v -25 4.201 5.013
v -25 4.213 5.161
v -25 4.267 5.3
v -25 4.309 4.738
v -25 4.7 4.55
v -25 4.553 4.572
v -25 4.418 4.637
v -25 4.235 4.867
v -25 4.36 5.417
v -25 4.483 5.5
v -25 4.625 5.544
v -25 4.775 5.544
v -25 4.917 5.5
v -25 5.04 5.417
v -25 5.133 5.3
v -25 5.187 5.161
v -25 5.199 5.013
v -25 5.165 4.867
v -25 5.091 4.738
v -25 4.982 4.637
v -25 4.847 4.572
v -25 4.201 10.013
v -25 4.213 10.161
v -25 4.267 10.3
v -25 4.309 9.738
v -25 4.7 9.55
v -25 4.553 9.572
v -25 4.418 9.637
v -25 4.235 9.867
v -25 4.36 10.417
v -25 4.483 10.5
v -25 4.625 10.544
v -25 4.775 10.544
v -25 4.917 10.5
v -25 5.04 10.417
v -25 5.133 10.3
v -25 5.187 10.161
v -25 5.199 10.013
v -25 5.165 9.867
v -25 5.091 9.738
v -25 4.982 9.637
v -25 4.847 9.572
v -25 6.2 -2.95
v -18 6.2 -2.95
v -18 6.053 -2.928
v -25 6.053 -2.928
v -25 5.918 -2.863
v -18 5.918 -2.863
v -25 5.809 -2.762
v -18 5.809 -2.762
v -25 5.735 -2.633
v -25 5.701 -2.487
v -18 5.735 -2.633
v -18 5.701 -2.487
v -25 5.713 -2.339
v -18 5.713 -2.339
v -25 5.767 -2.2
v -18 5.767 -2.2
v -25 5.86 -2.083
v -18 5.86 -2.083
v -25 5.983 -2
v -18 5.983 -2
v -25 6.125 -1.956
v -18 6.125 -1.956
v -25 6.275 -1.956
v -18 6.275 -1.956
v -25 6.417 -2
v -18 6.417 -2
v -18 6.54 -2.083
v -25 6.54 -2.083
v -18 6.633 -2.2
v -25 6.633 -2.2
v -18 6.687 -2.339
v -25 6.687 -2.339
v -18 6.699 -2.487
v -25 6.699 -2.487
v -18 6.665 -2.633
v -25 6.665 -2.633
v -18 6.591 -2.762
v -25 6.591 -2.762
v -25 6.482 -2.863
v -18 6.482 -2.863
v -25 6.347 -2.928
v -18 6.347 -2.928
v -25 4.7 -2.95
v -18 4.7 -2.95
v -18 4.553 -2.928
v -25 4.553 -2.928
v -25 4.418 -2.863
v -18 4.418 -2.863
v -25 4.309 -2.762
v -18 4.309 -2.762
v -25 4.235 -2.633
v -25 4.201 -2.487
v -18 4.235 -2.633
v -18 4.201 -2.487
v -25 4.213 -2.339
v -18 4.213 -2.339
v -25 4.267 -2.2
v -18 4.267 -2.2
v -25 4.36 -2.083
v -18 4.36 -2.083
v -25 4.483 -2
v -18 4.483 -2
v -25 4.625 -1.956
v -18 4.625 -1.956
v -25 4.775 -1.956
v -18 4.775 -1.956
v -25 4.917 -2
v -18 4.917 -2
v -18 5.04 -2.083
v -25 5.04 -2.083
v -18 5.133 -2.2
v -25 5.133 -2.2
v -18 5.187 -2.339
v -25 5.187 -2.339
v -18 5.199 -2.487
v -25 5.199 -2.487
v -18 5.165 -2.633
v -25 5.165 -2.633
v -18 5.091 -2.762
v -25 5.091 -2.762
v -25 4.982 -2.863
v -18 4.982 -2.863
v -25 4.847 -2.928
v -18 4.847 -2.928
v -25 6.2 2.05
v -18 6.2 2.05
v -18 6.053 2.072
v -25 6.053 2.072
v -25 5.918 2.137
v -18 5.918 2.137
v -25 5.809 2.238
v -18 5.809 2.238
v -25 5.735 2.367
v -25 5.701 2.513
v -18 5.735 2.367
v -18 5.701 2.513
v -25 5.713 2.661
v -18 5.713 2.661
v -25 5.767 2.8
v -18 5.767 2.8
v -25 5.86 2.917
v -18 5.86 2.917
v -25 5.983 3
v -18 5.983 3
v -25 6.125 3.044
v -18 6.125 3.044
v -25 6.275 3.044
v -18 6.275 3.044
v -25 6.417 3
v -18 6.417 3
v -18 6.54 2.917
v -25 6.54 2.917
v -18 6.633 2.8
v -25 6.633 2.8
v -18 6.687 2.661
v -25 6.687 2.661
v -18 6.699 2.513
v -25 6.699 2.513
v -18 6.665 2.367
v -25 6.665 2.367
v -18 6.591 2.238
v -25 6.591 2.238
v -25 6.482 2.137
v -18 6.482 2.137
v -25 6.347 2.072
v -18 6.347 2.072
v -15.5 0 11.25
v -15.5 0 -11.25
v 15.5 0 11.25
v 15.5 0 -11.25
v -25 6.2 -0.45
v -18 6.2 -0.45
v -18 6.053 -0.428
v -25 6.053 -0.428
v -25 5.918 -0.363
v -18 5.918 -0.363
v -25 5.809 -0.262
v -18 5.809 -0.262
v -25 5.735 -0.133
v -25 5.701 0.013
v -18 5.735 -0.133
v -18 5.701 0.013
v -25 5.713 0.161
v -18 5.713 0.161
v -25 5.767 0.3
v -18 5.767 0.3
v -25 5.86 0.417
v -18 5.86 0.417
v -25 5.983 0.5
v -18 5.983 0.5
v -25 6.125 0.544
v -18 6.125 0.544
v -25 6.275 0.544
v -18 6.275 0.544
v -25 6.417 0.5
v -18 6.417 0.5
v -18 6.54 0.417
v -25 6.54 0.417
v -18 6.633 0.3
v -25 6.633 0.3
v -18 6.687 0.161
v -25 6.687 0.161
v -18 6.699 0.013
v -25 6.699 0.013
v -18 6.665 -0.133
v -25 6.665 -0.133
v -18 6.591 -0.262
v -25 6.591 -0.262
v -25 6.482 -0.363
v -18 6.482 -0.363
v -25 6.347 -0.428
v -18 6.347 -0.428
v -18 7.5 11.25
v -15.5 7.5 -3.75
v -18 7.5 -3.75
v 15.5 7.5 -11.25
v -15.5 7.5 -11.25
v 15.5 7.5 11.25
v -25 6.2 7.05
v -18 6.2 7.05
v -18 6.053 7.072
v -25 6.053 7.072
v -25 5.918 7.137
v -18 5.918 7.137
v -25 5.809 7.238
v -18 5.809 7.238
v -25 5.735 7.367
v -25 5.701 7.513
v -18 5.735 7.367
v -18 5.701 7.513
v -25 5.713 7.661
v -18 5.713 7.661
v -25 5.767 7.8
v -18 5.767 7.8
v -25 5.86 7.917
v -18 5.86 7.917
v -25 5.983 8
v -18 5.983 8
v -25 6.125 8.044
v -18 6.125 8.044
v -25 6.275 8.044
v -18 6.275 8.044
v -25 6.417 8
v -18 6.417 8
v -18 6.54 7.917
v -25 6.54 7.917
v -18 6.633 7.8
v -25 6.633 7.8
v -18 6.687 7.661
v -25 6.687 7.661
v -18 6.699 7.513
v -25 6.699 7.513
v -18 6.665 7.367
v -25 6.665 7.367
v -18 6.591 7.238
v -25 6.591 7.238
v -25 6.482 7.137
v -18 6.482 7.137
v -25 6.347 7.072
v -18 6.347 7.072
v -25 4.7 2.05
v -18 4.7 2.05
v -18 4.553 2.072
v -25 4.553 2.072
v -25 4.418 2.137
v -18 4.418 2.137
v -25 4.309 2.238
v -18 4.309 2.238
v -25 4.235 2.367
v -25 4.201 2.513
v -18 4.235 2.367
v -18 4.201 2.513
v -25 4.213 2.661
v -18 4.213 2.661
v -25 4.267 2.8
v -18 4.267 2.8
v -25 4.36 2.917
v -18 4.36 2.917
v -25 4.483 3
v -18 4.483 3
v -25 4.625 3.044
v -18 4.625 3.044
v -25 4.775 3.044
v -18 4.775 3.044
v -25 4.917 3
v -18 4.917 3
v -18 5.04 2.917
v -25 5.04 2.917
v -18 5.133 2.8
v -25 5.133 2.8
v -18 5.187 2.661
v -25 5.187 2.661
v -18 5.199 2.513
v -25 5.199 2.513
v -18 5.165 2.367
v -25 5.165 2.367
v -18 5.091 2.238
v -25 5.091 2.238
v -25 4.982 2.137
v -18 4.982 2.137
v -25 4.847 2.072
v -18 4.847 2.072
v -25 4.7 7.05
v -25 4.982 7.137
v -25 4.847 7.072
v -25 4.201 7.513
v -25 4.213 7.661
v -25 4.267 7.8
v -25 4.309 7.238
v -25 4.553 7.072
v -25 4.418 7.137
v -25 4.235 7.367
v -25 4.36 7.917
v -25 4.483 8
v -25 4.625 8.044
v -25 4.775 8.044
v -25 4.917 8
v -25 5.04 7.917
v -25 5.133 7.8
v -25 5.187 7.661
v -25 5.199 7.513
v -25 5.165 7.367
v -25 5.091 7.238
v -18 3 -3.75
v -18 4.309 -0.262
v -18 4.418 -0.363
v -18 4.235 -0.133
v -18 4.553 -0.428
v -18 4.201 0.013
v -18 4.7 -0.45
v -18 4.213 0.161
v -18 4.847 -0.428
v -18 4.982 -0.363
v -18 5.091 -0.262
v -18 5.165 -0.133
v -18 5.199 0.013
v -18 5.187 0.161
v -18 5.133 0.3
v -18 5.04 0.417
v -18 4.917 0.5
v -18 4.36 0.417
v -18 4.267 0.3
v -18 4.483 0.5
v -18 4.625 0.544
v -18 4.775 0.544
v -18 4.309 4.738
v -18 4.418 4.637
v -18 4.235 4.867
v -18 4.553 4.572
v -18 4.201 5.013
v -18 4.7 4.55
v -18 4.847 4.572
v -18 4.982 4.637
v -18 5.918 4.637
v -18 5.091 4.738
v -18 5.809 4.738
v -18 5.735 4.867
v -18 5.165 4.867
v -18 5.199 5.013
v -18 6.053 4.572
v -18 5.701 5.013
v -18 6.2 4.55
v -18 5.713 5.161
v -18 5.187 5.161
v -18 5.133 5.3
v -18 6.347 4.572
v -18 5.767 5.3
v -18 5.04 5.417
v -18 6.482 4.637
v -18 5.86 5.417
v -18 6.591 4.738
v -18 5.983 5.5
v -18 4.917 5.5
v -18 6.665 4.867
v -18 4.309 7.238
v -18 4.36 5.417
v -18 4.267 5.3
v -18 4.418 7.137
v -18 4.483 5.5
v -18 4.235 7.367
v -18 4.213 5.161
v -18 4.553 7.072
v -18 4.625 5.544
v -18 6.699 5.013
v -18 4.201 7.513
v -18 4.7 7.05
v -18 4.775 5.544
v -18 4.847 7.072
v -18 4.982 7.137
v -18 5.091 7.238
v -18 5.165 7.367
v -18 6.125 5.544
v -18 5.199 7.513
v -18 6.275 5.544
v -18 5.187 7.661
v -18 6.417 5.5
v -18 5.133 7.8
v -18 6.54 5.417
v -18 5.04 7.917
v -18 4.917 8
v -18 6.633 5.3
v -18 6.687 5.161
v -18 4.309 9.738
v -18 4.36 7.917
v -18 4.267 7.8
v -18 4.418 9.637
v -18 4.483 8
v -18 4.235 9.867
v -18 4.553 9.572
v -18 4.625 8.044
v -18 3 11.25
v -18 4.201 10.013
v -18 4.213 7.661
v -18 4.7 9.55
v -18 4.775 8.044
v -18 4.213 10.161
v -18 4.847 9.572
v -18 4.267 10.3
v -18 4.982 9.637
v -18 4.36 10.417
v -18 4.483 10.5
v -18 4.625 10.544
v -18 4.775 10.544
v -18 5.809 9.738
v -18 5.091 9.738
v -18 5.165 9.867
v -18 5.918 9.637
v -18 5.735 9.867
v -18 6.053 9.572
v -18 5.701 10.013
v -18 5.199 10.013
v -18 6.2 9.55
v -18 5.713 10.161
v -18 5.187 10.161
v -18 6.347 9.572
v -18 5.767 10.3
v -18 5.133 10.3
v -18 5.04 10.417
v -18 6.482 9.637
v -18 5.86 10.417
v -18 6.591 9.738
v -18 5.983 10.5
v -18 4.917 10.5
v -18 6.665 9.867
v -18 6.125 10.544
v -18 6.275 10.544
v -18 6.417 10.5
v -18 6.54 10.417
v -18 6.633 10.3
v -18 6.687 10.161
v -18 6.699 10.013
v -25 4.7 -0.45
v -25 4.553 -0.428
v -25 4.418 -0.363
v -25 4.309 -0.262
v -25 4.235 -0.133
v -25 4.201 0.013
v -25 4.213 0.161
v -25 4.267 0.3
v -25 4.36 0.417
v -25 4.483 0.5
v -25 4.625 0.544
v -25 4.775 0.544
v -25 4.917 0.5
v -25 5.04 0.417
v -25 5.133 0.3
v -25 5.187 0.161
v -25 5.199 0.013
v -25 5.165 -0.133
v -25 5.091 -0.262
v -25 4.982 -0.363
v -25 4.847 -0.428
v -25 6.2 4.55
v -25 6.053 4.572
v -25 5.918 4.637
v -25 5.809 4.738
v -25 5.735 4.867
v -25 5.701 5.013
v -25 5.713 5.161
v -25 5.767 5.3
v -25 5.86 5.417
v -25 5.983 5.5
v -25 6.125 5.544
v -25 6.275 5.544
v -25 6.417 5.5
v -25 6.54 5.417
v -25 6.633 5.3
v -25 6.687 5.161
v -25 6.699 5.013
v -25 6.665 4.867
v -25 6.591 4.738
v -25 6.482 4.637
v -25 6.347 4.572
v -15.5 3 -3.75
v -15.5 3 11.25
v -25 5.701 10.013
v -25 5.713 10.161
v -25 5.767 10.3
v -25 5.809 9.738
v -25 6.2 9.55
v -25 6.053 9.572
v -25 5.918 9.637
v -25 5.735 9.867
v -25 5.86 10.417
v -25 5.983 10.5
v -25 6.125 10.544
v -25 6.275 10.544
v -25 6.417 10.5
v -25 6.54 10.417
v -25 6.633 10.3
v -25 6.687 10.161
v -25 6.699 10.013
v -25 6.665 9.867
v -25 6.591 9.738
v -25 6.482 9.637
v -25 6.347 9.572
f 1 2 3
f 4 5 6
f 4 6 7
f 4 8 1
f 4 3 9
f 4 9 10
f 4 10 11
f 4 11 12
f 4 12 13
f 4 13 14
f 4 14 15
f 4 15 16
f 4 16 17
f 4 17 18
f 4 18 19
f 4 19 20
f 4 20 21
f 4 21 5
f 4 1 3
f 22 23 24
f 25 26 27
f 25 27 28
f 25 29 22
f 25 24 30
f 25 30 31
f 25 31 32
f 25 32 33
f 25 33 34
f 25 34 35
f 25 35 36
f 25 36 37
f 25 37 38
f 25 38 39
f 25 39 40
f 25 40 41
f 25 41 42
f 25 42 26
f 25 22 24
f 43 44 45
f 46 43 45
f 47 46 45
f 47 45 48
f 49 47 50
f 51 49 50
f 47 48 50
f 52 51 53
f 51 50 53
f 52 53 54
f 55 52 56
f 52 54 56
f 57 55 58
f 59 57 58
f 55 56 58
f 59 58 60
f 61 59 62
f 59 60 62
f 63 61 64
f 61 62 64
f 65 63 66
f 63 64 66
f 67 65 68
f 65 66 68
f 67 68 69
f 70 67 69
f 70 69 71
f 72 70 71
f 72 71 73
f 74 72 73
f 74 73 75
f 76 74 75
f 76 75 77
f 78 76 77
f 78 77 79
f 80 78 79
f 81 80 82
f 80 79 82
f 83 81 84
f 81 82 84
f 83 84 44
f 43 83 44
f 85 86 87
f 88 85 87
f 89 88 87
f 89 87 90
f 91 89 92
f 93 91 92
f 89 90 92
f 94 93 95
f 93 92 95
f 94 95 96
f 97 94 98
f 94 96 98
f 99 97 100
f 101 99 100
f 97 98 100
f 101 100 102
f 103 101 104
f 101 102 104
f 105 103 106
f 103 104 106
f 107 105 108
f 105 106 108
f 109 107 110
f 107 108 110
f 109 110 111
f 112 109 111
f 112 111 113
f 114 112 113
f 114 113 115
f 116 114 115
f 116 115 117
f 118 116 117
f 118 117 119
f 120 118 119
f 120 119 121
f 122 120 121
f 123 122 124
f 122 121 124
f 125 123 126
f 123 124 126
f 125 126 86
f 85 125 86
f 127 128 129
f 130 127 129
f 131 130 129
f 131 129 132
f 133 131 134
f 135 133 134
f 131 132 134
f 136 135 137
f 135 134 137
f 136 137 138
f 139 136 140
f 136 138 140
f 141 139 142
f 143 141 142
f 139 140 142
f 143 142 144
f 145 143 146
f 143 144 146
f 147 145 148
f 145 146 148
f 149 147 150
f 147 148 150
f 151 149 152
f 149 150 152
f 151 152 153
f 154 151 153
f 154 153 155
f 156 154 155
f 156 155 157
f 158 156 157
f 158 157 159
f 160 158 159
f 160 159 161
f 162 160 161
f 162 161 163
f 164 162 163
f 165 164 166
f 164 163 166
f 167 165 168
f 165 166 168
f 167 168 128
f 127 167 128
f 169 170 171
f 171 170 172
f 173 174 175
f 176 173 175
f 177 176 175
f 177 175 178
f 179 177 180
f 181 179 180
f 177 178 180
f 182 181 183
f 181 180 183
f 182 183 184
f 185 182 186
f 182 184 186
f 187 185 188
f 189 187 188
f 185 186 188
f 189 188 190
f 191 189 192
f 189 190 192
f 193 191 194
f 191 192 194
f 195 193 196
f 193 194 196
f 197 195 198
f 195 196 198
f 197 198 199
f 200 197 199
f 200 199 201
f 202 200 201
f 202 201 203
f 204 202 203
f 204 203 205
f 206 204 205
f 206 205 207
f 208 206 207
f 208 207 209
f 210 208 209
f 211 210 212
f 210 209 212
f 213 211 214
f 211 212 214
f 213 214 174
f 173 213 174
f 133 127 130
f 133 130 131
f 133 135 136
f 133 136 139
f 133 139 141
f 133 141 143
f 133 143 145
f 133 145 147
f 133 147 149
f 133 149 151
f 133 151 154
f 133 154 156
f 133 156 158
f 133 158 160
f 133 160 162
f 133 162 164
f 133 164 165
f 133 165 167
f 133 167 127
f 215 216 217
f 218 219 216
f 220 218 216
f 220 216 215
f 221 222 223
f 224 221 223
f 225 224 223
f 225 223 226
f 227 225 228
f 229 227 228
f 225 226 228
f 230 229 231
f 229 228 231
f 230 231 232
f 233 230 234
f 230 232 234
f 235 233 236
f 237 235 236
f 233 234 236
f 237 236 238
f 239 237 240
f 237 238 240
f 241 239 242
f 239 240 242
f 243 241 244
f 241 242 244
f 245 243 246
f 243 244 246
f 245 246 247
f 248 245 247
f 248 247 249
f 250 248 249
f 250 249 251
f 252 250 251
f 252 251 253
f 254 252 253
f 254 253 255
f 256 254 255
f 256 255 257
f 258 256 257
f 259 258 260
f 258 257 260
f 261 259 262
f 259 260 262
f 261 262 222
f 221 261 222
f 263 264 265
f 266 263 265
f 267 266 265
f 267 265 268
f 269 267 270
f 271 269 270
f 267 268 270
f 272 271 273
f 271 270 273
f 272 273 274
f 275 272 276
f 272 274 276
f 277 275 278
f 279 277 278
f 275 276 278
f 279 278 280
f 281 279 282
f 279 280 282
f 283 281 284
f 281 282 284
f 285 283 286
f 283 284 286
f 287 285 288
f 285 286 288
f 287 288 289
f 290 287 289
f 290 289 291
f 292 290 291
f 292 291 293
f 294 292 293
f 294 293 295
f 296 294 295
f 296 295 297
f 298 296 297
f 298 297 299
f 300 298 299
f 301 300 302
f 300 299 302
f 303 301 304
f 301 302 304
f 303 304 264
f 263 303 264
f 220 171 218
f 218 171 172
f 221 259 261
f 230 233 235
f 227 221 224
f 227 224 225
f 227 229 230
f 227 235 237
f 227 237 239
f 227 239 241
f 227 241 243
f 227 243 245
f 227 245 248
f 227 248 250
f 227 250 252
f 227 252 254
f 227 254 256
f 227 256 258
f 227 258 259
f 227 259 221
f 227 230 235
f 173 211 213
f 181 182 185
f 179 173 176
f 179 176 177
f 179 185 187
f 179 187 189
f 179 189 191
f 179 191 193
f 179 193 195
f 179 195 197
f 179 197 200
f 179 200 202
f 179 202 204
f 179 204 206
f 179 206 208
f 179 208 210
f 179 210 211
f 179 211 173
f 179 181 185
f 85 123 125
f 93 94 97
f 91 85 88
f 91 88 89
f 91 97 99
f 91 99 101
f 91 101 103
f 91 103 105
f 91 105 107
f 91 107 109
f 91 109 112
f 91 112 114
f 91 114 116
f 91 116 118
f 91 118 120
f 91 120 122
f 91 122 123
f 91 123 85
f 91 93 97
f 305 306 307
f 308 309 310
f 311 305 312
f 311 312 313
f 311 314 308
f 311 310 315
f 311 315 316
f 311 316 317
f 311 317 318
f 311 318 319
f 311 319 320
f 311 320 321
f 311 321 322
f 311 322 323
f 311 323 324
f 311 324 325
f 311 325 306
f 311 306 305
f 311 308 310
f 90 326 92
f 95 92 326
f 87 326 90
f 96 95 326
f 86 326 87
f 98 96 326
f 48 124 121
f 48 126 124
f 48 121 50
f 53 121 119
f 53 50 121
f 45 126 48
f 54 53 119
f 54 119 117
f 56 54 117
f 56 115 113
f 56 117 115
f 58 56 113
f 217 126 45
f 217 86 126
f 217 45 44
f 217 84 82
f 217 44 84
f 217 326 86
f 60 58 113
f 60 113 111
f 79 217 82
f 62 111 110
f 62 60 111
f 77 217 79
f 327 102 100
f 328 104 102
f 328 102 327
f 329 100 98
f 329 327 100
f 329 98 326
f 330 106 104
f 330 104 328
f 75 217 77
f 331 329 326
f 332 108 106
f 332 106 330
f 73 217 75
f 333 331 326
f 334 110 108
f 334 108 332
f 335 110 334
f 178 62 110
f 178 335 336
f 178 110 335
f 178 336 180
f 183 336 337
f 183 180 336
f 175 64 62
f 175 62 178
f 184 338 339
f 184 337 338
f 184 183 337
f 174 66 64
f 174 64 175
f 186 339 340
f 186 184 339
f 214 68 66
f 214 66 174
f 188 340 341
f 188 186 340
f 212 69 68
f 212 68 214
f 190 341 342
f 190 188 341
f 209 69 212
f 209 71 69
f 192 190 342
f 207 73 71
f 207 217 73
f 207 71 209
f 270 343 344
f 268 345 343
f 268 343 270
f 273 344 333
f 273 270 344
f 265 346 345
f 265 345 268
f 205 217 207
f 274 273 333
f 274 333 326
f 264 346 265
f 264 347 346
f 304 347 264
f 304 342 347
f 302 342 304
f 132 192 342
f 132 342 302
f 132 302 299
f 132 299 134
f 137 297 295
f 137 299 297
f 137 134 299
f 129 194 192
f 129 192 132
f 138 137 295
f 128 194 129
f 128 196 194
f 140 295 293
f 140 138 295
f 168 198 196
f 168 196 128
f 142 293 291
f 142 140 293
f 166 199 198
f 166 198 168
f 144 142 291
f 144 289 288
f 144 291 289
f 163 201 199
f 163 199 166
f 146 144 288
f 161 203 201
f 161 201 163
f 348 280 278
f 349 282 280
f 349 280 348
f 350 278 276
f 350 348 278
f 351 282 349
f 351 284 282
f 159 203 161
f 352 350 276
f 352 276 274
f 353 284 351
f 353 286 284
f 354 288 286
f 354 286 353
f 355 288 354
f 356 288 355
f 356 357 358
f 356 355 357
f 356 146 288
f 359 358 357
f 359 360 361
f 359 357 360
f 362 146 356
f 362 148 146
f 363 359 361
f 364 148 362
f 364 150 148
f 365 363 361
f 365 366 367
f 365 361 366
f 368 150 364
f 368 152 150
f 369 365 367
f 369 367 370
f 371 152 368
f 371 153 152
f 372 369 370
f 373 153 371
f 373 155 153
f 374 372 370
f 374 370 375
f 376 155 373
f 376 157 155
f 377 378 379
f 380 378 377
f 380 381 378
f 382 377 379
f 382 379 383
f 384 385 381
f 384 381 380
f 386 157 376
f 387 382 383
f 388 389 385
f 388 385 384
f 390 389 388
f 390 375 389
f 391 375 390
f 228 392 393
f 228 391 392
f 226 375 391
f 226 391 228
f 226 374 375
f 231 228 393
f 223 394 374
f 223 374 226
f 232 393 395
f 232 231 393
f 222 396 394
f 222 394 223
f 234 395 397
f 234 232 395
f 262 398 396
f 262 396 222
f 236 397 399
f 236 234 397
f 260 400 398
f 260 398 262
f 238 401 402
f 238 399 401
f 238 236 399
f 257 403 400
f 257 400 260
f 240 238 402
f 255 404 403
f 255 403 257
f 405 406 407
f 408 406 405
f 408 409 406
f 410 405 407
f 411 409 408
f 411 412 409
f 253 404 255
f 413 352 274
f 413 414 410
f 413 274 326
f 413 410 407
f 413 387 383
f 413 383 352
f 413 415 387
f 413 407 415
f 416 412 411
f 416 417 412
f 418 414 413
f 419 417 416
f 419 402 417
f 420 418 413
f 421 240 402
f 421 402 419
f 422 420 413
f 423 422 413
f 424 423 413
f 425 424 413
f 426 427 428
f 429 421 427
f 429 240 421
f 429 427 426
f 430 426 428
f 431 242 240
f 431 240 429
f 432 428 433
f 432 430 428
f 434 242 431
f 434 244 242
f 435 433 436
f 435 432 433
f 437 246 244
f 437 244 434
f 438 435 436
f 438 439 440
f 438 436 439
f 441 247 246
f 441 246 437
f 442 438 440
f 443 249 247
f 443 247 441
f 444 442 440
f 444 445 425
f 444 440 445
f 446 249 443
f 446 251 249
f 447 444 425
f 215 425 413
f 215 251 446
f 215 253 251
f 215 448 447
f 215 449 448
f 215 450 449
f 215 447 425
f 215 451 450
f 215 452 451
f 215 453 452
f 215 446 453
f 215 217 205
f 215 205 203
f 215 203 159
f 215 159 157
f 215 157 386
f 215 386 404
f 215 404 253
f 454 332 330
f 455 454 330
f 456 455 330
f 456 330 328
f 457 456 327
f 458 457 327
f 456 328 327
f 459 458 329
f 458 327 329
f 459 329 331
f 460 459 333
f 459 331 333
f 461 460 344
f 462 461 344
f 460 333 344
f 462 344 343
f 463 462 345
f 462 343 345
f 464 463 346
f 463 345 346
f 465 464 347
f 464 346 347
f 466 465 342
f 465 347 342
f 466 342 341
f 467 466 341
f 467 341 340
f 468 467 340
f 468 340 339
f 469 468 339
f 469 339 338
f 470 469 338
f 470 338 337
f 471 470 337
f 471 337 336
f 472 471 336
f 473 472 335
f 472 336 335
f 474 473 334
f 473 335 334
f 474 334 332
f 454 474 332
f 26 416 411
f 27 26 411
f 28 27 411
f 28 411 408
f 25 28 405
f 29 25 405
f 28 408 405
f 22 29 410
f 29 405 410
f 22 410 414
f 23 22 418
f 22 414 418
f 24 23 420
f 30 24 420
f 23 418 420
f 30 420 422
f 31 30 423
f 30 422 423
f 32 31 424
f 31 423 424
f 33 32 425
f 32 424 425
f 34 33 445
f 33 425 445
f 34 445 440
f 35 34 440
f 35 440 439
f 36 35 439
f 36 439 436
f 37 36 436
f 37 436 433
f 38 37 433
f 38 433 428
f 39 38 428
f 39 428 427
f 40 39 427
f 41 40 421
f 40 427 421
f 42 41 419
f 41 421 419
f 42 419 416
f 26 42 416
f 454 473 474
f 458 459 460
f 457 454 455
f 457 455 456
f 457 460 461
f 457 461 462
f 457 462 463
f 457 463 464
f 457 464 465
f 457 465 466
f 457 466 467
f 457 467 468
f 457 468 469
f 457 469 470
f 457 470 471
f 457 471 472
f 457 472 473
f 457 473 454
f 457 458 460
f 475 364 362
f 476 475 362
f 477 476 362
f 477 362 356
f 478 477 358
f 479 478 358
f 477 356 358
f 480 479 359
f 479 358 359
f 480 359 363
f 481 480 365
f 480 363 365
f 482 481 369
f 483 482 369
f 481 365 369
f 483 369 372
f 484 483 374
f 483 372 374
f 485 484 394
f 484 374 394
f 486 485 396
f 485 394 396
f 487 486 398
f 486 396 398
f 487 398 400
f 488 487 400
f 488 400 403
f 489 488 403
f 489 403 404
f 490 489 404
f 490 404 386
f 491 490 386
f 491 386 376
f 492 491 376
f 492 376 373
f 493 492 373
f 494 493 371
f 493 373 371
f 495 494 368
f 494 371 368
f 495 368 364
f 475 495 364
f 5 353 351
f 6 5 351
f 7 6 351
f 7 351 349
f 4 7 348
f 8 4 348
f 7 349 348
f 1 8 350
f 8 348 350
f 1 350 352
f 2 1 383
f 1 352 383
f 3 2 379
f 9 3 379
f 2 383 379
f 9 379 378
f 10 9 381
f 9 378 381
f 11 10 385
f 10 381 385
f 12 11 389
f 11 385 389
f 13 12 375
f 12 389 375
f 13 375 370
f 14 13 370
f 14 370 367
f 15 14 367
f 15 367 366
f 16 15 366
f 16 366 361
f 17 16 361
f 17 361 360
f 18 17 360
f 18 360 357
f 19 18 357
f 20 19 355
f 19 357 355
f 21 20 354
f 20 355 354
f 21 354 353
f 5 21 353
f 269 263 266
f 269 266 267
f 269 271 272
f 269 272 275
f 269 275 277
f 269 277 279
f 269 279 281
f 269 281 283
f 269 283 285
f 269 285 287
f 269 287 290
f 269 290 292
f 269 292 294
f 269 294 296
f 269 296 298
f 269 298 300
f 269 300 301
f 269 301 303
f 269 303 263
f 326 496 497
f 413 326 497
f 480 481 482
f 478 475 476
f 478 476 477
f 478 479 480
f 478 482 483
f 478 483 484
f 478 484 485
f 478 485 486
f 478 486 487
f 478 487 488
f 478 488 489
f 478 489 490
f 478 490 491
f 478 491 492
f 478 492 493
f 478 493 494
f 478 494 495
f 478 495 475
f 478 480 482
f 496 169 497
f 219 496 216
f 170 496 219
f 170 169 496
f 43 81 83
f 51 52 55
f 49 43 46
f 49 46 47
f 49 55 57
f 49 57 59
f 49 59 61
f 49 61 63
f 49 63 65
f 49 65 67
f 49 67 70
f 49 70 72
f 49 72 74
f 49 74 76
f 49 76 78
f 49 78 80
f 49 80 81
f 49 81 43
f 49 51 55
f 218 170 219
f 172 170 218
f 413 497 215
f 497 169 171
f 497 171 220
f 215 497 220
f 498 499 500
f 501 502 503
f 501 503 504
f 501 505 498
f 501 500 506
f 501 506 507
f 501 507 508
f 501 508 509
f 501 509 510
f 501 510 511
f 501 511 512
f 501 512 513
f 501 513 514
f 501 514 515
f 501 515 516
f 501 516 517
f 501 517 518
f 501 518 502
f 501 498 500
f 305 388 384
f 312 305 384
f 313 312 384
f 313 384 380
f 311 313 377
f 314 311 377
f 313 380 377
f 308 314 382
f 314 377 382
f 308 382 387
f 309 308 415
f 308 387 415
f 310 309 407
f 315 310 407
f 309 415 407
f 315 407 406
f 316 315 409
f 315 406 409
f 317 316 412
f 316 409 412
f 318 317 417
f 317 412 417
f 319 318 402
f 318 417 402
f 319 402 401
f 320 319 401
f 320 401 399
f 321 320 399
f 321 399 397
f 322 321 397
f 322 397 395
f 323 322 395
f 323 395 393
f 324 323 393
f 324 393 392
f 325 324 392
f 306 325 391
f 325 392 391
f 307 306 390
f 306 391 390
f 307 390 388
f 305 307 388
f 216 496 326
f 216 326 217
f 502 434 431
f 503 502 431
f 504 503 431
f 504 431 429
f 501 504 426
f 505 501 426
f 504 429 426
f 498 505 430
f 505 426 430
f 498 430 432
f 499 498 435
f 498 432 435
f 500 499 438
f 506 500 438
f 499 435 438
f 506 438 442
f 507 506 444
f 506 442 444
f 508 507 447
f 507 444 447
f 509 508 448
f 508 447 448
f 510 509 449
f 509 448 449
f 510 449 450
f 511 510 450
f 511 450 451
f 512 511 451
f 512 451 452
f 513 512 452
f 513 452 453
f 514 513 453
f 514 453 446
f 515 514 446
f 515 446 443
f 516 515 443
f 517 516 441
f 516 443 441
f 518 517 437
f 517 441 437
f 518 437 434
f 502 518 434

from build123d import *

# Parameters (mm, degrees)
SKETCH1_W           = 31
SKETCH1_H           = 22.5
BOSS_EXTRUDE1_DEPTH = 7.5
SKETCH2_W           = 15
SKETCH2_H           = 4.5
BOSS_EXTRUDE2_DEPTH = 2.5
SKETCH3_R           = 0.5
BOSS_EXTRUDE3_DEPTH = 7


with BuildPart() as part:
    # Sketch1 → Boss-Extrude1 (new body)
    with BuildSketch(Plane(origin=(0, 0, 0), x_dir=(1, 0, 0), z_dir=(0, 1, 0))):
        Rectangle(SKETCH1_W, SKETCH1_H)
    extrude(amount=BOSS_EXTRUDE1_DEPTH)

    # Sketch2 → Boss-Extrude2 (add)
    with BuildSketch(Plane.ZY.offset(15.5)):
        with Locations((3.75, 5.25)):
            Rectangle(SKETCH2_W, SKETCH2_H)
    extrude(amount=BOSS_EXTRUDE2_DEPTH)

    # Sketch3 → Boss-Extrude3 (add)
    with BuildSketch(Plane.ZY.offset(18)):
        with Locations(Location((-2.45, 6.2, 0), (0, 0, 180))):
            Circle(SKETCH3_R)
        with Locations(Location((0.05, 6.2, 0), (0, 0, 180))):
            Circle(SKETCH3_R)
        with Locations(Location((2.55, 6.2, 0), (0, 0, 180))):
            Circle(SKETCH3_R)
        with Locations(Location((5.05, 6.2, 0), (0, 0, 180))):
            Circle(SKETCH3_R)
        with Locations(Location((7.55, 6.2, 0), (0, 0, 180))):
            Circle(SKETCH3_R)
        with Locations(Location((10.05, 6.2, 0), (0, 0, 180))):
            Circle(SKETCH3_R)
        with Locations(Location((-2.45, 4.7, 0), (0, 0, 180))):
            Circle(SKETCH3_R)
        with Locations(Location((0.05, 4.7, 0), (0, 0, 180))):
            Circle(SKETCH3_R)
        with Locations(Location((2.55, 4.7, 0), (0, 0, 180))):
            Circle(SKETCH3_R)
        with Locations(Location((5.05, 4.7, 0), (0, 0, 180))):
            Circle(SKETCH3_R)
        with Locations(Location((7.55, 4.7, 0), (0, 0, 180))):
            Circle(SKETCH3_R)
        with Locations(Location((10.05, 4.7, 0), (0, 0, 180))):
            Circle(SKETCH3_R)
    extrude(amount=BOSS_EXTRUDE3_DEPTH)


solid = part.part
